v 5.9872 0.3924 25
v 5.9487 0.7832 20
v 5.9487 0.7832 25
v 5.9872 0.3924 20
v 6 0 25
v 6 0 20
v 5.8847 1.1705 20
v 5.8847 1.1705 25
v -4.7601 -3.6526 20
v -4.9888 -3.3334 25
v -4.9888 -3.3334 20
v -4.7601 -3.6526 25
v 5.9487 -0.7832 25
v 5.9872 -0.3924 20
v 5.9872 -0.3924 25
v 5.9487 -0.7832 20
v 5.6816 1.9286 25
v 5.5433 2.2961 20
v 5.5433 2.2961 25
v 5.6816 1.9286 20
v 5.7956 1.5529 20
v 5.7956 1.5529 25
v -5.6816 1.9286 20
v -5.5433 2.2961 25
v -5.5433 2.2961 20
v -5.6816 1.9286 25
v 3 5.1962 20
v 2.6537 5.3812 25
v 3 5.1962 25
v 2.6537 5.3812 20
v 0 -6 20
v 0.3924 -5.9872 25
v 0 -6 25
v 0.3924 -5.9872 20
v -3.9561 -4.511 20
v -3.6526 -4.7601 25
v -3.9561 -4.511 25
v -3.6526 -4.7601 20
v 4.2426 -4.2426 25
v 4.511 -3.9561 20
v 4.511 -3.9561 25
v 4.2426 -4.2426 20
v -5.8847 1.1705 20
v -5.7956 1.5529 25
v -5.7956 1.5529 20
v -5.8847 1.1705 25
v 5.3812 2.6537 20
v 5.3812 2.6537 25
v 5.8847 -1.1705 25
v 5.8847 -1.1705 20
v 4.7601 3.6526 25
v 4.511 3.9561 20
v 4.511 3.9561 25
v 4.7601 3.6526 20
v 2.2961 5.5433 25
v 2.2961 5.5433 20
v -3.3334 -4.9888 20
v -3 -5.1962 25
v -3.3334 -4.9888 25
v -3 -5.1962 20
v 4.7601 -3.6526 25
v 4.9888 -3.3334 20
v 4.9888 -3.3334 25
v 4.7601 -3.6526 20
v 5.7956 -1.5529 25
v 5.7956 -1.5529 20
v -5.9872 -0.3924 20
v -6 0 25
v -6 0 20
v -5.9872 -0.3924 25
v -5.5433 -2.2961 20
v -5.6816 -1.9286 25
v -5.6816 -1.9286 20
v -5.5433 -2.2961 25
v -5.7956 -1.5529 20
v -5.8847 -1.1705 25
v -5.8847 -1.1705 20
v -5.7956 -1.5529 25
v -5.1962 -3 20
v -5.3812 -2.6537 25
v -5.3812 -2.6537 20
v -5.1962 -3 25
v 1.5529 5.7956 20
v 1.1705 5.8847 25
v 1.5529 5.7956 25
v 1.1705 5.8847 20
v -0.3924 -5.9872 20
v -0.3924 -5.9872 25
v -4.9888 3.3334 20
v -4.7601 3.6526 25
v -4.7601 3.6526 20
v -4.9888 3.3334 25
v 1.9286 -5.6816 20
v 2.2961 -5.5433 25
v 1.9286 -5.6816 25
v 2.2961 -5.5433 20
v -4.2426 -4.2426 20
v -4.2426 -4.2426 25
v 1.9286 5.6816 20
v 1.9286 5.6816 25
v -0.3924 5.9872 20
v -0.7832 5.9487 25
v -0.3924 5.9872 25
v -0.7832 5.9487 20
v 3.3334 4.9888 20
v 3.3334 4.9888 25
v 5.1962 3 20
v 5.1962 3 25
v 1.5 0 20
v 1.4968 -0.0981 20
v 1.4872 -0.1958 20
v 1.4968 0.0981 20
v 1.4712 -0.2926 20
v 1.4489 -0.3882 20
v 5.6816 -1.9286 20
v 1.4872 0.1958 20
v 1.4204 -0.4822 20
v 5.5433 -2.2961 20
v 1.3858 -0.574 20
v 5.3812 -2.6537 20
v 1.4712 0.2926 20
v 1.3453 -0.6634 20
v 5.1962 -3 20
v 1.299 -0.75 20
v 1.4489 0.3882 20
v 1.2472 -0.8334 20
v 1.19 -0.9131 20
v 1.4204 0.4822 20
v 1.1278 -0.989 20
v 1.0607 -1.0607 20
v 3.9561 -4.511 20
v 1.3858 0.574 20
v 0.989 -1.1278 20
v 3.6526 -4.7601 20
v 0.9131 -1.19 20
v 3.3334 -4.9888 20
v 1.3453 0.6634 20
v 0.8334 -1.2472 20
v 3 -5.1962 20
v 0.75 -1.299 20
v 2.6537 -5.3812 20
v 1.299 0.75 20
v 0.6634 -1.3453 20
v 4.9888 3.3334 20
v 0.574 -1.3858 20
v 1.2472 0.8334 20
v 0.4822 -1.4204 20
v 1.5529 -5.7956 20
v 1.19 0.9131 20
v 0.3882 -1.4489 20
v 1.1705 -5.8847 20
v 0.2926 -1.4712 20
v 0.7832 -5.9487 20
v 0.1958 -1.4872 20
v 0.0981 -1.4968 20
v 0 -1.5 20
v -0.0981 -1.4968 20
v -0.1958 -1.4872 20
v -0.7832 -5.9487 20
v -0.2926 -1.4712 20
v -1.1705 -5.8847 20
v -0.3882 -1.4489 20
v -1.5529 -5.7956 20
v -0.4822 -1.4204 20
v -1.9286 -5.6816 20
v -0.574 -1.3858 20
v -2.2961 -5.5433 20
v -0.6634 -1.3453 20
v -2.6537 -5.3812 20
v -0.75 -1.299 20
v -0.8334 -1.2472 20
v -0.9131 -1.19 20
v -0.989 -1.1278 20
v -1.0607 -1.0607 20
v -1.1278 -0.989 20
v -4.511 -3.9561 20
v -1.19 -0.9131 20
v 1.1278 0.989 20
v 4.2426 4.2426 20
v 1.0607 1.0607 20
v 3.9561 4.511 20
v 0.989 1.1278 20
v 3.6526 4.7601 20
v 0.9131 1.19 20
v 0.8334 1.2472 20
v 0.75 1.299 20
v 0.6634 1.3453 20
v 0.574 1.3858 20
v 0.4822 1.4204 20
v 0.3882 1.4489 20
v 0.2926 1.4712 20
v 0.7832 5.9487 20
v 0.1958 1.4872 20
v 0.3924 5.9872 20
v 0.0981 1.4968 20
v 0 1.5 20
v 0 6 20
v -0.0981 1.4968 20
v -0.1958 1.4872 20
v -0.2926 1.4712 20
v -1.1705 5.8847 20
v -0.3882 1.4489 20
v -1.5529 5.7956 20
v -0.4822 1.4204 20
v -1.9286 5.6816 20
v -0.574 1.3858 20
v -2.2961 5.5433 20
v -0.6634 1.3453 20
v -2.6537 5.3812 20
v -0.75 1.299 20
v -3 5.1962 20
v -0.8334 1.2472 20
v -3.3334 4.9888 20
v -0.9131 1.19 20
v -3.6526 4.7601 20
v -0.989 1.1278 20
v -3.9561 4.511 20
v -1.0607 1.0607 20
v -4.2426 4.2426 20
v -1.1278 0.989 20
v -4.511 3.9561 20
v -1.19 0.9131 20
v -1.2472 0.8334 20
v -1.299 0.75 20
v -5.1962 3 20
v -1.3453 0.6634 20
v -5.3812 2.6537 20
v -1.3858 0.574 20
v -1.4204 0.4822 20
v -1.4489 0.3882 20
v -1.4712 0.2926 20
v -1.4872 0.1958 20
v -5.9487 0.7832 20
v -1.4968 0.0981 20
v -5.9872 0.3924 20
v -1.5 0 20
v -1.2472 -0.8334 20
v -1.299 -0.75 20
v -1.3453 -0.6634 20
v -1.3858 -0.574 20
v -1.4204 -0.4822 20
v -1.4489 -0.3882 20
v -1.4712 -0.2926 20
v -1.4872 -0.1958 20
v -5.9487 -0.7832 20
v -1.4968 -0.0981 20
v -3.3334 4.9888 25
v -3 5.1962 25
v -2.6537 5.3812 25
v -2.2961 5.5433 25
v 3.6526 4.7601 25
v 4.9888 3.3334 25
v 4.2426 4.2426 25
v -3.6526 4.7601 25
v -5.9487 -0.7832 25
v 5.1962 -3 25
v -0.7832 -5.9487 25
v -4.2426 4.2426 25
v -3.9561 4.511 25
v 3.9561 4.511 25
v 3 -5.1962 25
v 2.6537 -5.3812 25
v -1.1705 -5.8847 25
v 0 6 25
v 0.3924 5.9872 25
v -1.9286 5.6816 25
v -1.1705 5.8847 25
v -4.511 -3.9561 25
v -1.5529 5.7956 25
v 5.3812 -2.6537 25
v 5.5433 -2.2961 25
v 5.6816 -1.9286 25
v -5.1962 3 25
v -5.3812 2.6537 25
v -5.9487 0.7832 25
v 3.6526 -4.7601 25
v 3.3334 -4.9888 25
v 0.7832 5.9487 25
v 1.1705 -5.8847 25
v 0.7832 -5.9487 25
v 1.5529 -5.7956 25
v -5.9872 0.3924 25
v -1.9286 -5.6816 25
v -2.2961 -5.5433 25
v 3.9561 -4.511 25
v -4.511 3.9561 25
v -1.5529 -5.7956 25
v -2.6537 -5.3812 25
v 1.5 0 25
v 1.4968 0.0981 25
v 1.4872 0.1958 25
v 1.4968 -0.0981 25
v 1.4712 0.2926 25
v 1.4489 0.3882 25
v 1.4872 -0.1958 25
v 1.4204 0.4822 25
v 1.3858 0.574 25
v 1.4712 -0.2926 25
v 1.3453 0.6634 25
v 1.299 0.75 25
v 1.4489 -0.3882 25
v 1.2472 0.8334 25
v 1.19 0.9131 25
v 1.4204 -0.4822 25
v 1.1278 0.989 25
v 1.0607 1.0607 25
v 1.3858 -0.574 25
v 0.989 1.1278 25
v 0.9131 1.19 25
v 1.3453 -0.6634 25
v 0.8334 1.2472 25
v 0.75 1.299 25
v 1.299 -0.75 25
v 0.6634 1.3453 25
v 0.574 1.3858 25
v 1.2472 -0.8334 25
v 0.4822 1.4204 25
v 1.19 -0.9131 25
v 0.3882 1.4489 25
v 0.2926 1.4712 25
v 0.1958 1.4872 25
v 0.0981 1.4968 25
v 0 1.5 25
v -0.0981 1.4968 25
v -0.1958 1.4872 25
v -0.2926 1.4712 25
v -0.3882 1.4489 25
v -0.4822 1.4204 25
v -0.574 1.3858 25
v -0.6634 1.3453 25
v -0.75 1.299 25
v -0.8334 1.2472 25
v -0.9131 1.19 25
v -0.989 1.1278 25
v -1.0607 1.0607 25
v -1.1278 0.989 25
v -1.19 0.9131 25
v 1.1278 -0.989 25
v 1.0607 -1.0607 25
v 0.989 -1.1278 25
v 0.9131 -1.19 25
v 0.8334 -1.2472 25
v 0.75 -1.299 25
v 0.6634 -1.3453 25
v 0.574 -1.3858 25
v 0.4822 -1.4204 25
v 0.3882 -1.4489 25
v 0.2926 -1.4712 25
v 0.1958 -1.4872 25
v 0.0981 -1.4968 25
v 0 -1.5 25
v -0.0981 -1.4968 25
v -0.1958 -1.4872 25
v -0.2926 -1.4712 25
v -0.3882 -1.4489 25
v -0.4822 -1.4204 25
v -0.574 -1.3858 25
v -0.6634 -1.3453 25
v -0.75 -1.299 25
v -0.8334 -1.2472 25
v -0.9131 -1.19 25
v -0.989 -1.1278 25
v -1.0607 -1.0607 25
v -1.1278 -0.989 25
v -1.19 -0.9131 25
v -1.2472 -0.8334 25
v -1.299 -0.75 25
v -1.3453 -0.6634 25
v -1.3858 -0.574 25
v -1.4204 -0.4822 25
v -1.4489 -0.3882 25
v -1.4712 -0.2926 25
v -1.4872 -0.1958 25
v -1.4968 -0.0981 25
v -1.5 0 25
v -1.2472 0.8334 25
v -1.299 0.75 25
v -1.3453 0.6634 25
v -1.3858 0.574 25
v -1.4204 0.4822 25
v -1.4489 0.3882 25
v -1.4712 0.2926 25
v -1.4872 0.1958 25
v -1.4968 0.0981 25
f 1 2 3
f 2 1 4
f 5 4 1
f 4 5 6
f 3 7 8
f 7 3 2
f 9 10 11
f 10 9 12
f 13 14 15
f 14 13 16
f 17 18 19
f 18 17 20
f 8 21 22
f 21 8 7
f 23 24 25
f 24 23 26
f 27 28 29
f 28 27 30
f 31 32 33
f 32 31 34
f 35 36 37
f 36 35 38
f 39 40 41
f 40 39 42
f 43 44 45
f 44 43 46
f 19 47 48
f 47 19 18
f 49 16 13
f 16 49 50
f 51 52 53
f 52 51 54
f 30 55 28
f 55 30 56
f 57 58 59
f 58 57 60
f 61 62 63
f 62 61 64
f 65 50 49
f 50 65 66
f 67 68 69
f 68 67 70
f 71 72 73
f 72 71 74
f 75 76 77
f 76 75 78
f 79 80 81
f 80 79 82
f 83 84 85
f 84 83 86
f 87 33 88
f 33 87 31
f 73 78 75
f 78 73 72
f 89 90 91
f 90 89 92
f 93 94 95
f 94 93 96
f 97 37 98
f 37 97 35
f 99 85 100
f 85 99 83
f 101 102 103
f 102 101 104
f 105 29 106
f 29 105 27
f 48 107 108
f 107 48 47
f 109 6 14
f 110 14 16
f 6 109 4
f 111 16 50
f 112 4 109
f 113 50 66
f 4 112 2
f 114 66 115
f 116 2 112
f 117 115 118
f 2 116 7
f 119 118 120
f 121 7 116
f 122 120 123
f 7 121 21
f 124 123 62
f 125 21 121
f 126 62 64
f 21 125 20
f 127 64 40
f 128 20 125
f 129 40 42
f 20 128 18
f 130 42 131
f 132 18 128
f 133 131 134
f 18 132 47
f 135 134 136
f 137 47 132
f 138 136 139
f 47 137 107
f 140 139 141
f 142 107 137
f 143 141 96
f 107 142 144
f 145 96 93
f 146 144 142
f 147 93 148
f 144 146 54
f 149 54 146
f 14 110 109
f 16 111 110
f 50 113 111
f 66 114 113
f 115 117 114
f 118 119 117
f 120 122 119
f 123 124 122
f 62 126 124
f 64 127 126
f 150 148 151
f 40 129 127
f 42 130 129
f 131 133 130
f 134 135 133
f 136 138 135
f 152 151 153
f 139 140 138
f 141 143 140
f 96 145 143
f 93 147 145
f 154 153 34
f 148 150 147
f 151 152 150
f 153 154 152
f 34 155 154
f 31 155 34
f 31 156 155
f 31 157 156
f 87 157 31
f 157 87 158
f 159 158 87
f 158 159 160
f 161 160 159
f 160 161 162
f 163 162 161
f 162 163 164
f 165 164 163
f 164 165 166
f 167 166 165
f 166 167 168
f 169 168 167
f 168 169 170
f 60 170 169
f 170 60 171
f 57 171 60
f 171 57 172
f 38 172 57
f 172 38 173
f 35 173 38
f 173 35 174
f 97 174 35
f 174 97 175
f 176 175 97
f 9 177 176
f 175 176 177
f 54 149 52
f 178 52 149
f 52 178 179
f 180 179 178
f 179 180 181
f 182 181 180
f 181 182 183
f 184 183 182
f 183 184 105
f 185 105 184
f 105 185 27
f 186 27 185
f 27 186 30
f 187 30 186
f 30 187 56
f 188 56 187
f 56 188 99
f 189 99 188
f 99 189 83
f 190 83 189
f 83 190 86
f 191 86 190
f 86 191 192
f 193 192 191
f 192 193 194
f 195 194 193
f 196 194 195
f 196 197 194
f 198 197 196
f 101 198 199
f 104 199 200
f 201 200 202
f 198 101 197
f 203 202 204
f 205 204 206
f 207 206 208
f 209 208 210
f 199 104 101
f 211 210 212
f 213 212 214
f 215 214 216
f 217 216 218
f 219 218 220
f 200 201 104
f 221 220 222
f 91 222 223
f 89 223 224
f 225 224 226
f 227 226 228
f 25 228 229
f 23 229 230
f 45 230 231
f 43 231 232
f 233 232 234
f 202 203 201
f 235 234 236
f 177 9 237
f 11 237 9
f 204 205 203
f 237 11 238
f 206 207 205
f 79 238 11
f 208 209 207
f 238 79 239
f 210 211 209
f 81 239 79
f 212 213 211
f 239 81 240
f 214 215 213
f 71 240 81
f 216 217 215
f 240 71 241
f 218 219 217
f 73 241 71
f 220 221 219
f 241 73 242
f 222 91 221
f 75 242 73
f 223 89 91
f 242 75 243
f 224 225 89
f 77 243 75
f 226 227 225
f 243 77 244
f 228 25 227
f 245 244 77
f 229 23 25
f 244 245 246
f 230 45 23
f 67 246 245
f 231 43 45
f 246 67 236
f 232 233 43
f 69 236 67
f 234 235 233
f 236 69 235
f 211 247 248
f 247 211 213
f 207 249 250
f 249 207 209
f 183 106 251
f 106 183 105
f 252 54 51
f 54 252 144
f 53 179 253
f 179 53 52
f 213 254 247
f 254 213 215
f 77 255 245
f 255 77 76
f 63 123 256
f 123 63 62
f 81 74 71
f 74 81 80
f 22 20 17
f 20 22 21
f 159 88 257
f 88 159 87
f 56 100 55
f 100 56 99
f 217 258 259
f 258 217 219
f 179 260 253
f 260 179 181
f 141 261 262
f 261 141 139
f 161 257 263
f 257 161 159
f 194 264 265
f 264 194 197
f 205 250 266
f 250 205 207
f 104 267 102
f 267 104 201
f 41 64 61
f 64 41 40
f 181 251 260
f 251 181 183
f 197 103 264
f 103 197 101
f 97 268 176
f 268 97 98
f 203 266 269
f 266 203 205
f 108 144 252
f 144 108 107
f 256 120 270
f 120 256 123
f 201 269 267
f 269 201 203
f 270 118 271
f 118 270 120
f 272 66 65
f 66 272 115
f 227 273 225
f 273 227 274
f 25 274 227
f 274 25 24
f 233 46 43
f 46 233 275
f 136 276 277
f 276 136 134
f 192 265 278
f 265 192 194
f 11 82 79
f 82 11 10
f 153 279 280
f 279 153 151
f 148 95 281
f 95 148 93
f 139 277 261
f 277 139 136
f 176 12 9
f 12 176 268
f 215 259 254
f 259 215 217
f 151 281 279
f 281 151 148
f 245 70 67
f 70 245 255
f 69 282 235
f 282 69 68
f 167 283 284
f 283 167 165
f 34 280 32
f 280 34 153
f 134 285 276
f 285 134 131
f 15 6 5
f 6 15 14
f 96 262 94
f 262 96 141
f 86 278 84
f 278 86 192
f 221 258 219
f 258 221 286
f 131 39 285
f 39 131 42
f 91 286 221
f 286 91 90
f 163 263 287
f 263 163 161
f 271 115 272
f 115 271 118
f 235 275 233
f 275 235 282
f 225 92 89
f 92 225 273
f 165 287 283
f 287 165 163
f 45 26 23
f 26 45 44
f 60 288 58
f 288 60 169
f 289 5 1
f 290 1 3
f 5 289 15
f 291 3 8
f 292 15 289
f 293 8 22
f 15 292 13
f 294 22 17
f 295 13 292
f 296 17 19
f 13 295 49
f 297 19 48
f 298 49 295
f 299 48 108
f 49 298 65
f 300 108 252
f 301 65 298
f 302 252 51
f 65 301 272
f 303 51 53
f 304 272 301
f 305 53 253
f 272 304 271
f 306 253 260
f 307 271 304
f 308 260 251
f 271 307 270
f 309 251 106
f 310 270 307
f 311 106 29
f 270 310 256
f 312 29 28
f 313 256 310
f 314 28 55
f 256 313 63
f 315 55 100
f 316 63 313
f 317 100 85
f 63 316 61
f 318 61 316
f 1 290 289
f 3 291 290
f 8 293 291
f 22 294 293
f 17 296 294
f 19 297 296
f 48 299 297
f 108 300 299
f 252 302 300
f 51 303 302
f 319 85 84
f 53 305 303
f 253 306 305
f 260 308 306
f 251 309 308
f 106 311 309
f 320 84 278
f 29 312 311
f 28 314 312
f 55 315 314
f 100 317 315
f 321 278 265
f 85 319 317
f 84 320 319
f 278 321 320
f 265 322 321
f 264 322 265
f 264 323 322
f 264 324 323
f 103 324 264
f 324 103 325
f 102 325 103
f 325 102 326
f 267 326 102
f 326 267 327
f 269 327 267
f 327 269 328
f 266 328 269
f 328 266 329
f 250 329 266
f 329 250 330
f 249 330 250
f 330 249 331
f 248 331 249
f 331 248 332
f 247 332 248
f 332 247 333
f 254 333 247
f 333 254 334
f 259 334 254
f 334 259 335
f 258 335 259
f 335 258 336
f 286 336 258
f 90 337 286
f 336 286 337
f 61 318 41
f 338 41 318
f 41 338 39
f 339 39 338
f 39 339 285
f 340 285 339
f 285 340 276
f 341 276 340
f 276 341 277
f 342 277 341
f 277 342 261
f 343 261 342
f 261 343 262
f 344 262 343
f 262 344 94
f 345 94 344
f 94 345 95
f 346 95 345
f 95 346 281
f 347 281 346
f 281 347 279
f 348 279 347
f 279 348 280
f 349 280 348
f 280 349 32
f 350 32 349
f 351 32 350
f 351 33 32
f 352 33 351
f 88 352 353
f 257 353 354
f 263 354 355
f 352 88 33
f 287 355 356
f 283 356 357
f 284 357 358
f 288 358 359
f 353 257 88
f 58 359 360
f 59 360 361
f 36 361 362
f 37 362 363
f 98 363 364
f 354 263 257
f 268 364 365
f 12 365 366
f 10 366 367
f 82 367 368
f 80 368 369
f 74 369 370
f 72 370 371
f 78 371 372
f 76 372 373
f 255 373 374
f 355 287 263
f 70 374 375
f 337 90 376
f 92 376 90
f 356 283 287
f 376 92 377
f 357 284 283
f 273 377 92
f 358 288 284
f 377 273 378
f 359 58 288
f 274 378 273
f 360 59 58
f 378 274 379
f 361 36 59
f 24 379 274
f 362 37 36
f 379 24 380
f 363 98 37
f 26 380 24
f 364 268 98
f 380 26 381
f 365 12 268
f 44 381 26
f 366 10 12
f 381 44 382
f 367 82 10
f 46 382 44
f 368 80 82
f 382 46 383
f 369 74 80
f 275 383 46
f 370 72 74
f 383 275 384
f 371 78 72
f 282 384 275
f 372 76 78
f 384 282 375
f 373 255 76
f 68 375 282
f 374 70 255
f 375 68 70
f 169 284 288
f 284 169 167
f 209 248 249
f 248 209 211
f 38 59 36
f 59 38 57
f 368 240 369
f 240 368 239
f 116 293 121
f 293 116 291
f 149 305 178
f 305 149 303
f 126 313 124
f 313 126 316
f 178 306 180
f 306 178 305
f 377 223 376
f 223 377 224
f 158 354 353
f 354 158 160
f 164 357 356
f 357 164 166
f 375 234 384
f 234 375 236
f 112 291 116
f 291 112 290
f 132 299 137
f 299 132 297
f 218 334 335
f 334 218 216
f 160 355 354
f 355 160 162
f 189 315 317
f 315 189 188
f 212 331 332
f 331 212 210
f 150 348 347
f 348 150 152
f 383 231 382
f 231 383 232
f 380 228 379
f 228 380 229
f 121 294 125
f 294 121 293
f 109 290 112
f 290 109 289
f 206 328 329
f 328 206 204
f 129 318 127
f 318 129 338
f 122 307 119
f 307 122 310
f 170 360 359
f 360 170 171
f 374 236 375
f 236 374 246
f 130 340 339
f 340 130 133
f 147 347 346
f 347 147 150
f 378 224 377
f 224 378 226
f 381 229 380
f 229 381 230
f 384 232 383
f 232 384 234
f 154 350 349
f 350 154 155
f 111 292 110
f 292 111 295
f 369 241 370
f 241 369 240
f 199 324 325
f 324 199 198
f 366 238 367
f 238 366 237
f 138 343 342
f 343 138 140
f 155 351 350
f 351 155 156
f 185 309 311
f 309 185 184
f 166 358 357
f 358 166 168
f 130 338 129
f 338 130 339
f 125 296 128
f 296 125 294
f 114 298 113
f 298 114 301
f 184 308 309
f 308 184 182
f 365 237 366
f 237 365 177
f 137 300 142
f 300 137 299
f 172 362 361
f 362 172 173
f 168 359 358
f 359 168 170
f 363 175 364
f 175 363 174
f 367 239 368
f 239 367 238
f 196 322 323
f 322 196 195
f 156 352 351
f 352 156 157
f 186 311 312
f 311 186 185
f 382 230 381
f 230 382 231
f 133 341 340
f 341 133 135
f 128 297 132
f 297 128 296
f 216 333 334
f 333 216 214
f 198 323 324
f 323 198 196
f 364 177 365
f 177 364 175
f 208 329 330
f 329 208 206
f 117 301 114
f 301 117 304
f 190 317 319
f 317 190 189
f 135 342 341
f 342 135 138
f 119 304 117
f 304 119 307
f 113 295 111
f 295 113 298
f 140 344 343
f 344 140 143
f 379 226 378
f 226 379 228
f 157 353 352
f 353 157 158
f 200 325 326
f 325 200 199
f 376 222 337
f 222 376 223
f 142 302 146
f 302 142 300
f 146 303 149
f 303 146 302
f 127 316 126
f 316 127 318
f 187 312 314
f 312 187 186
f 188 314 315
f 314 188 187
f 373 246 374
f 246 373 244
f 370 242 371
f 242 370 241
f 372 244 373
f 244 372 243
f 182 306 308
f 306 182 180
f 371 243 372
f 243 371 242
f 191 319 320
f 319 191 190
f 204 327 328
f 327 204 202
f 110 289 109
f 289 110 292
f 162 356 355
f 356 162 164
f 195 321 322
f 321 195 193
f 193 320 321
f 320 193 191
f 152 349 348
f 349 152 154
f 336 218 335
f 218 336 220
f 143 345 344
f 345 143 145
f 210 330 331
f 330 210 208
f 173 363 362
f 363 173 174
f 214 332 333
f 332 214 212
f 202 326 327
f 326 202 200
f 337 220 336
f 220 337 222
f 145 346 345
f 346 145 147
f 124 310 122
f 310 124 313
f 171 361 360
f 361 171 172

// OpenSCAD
// Hose-barb reducer: 8 mm ID tubing (z = 0..20) to 5 mm ID tubing (z = 25..41)
// Print orientation: standing upright along +Z, centred on origin in X/Y
// Units: mm

// ---------------- Parameters ----------------
bore          = 3;    // through-bore diameter (full length)
barb_8_od_bot = 7.5;  // outer diameter of 8 mm barbs at bottom (z = 0)
barb_8_od_top = 9.5;  // outer diameter of 8 mm barbs at top (z = 20)
barb_8_h      = 10;   // height of each 8 mm barb
barb_8_n      = 2;    // number of 8 mm barbs (stacked)

collar_od     = 12;   // outer diameter of cylindrical collar (z = 20..25)
collar_h      = 5;    // collar height

barb_5_od_bot = 6.5;  // outer diameter of 5 mm barbs at bottom (z = 25)
barb_5_od_top = 5.0;  // outer diameter of 5 mm barbs at top (z = 41)
barb_5_h      = 8;    // height of each 5 mm barb
barb_5_n      = 2;    // number of 5 mm barbs (stacked)

eps           = 0.5;  // overlap / extension for clean boolean cuts
$fn           = 96;   // curve resolution

// ---------------- Derived ----------------
z0      = 0;                    // start of 8 mm barbs
z20     = z0 + barb_8_h * 2;    // top of 8 mm barbs (10 mm each, stacked)
z25     = z20 + collar_h;       // top of collar
z41     = z25 + barb_5_h * 2;   // top of 5 mm barbs (8 mm each, stacked)

// ---------------- Model ----------------
difference() {
    union() {
        // 8 mm tubing barbs (sawtooth profile, stacked)
        for (i = [0 : barb_8_n - 1]) {
            translate([0, 0, z0 + i * barb_8_h])
                linear_extrude(height = barb_8_h)
                    polygon([
                        [0, -barb_8_od_bot / 2],
                        [0,  barb_8_od_bot / 2],
                        [0,  barb_8_od_top / 2]
                    ]);
        }

        // Cylindrical collar (z = 20..25)
        translate([0, 0, z20])
            cylinder(d = collar_od, h = collar_h);

        // 5 mm tubing barbs (tapered, stacked)
        for (i = [0 : barb_5_n - 1]) {
            translate([0, 0, z25 + i * barb_5_h])
                linear_extrude(height = barb_5_h)
                    polygon([
                        [0, -barb_5_od_bot / 2],
                        [0,  barb_5_od_bot / 2],
                        [0,  barb_5_od_top / 2]
                    ]);
        }
    }

    // Full-length through-bore
    translate([0, 0, -eps])
        cylinder(d = bore, h = z41 + 2 * eps);
}
